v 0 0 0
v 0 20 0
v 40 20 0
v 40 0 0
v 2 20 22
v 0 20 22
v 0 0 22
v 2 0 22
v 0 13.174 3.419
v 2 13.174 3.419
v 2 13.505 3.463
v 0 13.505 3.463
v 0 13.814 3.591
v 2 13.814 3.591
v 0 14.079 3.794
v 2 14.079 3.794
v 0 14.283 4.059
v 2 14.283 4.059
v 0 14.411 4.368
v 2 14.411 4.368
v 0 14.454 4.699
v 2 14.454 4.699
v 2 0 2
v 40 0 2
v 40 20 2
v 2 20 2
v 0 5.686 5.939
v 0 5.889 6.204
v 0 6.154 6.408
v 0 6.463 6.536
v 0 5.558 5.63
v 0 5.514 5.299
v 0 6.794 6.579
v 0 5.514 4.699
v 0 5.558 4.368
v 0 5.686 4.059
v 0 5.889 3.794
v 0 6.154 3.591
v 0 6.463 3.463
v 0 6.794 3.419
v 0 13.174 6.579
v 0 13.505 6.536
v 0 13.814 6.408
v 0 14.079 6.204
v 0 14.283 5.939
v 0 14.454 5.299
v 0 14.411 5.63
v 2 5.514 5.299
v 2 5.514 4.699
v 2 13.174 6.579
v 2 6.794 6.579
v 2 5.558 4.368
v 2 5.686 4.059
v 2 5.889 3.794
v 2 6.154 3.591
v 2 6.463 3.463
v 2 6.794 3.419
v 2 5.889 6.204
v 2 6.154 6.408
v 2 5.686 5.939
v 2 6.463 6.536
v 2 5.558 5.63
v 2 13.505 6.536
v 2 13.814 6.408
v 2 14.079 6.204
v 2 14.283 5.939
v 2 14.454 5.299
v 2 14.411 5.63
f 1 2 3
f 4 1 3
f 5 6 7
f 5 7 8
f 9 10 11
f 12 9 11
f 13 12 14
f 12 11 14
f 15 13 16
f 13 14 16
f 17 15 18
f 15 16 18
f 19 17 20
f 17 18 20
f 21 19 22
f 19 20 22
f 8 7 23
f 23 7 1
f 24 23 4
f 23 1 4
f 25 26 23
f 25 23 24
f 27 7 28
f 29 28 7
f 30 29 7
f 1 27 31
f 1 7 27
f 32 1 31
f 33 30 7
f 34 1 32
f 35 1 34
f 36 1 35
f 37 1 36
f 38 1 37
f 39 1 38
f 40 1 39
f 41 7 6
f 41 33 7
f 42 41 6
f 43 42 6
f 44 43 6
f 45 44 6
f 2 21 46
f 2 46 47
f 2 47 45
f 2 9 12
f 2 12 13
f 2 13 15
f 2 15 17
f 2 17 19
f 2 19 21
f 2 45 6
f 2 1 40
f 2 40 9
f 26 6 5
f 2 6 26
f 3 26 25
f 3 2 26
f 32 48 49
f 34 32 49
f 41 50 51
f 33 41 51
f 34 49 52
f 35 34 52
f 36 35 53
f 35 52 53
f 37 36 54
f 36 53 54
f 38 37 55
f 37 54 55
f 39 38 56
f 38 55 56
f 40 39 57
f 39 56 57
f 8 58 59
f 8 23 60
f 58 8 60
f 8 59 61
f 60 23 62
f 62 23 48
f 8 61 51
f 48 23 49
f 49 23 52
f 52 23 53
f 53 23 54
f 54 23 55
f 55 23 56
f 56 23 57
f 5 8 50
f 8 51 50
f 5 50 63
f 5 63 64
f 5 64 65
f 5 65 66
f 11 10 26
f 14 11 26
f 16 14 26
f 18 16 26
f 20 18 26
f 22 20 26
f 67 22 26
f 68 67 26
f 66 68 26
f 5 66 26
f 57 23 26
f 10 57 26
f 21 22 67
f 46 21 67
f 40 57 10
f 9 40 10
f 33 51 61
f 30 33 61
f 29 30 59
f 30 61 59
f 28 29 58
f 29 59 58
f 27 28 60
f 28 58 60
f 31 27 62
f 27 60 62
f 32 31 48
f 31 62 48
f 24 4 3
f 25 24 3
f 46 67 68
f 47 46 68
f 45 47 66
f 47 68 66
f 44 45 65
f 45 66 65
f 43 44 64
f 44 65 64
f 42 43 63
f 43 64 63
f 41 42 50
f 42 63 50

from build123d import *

# Parameters (mm, degrees)
SKETCH_1_W          = 40
SKETCH_1_H          = 20
EXTRUDE_1_DEPTH     = 2
SKETCH_2_W          = 2
SKETCH_2_H          = 20
EXTRUDE_2_DEPTH     = 20
CUT_EXTRUDE_1_DEPTH = 20


with BuildPart() as part:
    # Эскиз1 → Бобышка-Вытянуть1 (new body)
    with BuildSketch(Plane.XY):
        with Locations((20, 10)):
            Rectangle(SKETCH_1_W, SKETCH_1_H)
    extrude(amount=EXTRUDE_1_DEPTH)

    # Эскиз2 → Бобышка-Вытянуть2 (add)
    with BuildSketch(Plane.XY.offset(2)):
        with Locations((1, 10)):
            Rectangle(SKETCH_2_W, SKETCH_2_H)
    extrude(amount=EXTRUDE_2_DEPTH)

    # Эскиз5 → Вырез-Вытянуть1 (cut)
    with BuildSketch(Plane(origin=(2, 0, 0), x_dir=(0, 0, -1), z_dir=(1, 0, 0))):
        with BuildLine():
            Line((-4.699152759, 14.454165244), (-5.299152759, 14.454165244))
            ThreePointArc((-5.299152759, 14.454165244), (-6.204249439, 14.079261924), (-6.579152759, 13.174165244))
            Line((-6.579152759, 13.174165244), (-6.579152759, 6.794165244))
            ThreePointArc((-6.579152759, 6.794165244), (-6.204249439, 5.889068564), (-5.299152759, 5.514165244))
            Line((-5.299152759, 5.514165244), (-4.699152759, 5.514165244))
            ThreePointArc((-4.699152759, 5.514165244), (-3.794056079, 5.889068564), (-3.419152759, 6.794165244))
            Line((-3.419152759, 6.794165244), (-3.419152759, 13.174165244))
            ThreePointArc((-3.419152759, 13.174165244), (-3.794056079, 14.079261924), (-4.699152759, 14.454165244))
        make_face()
    extrude(amount=-CUT_EXTRUDE_1_DEPTH, mode=Mode.SUBTRACT)


solid = part.part
